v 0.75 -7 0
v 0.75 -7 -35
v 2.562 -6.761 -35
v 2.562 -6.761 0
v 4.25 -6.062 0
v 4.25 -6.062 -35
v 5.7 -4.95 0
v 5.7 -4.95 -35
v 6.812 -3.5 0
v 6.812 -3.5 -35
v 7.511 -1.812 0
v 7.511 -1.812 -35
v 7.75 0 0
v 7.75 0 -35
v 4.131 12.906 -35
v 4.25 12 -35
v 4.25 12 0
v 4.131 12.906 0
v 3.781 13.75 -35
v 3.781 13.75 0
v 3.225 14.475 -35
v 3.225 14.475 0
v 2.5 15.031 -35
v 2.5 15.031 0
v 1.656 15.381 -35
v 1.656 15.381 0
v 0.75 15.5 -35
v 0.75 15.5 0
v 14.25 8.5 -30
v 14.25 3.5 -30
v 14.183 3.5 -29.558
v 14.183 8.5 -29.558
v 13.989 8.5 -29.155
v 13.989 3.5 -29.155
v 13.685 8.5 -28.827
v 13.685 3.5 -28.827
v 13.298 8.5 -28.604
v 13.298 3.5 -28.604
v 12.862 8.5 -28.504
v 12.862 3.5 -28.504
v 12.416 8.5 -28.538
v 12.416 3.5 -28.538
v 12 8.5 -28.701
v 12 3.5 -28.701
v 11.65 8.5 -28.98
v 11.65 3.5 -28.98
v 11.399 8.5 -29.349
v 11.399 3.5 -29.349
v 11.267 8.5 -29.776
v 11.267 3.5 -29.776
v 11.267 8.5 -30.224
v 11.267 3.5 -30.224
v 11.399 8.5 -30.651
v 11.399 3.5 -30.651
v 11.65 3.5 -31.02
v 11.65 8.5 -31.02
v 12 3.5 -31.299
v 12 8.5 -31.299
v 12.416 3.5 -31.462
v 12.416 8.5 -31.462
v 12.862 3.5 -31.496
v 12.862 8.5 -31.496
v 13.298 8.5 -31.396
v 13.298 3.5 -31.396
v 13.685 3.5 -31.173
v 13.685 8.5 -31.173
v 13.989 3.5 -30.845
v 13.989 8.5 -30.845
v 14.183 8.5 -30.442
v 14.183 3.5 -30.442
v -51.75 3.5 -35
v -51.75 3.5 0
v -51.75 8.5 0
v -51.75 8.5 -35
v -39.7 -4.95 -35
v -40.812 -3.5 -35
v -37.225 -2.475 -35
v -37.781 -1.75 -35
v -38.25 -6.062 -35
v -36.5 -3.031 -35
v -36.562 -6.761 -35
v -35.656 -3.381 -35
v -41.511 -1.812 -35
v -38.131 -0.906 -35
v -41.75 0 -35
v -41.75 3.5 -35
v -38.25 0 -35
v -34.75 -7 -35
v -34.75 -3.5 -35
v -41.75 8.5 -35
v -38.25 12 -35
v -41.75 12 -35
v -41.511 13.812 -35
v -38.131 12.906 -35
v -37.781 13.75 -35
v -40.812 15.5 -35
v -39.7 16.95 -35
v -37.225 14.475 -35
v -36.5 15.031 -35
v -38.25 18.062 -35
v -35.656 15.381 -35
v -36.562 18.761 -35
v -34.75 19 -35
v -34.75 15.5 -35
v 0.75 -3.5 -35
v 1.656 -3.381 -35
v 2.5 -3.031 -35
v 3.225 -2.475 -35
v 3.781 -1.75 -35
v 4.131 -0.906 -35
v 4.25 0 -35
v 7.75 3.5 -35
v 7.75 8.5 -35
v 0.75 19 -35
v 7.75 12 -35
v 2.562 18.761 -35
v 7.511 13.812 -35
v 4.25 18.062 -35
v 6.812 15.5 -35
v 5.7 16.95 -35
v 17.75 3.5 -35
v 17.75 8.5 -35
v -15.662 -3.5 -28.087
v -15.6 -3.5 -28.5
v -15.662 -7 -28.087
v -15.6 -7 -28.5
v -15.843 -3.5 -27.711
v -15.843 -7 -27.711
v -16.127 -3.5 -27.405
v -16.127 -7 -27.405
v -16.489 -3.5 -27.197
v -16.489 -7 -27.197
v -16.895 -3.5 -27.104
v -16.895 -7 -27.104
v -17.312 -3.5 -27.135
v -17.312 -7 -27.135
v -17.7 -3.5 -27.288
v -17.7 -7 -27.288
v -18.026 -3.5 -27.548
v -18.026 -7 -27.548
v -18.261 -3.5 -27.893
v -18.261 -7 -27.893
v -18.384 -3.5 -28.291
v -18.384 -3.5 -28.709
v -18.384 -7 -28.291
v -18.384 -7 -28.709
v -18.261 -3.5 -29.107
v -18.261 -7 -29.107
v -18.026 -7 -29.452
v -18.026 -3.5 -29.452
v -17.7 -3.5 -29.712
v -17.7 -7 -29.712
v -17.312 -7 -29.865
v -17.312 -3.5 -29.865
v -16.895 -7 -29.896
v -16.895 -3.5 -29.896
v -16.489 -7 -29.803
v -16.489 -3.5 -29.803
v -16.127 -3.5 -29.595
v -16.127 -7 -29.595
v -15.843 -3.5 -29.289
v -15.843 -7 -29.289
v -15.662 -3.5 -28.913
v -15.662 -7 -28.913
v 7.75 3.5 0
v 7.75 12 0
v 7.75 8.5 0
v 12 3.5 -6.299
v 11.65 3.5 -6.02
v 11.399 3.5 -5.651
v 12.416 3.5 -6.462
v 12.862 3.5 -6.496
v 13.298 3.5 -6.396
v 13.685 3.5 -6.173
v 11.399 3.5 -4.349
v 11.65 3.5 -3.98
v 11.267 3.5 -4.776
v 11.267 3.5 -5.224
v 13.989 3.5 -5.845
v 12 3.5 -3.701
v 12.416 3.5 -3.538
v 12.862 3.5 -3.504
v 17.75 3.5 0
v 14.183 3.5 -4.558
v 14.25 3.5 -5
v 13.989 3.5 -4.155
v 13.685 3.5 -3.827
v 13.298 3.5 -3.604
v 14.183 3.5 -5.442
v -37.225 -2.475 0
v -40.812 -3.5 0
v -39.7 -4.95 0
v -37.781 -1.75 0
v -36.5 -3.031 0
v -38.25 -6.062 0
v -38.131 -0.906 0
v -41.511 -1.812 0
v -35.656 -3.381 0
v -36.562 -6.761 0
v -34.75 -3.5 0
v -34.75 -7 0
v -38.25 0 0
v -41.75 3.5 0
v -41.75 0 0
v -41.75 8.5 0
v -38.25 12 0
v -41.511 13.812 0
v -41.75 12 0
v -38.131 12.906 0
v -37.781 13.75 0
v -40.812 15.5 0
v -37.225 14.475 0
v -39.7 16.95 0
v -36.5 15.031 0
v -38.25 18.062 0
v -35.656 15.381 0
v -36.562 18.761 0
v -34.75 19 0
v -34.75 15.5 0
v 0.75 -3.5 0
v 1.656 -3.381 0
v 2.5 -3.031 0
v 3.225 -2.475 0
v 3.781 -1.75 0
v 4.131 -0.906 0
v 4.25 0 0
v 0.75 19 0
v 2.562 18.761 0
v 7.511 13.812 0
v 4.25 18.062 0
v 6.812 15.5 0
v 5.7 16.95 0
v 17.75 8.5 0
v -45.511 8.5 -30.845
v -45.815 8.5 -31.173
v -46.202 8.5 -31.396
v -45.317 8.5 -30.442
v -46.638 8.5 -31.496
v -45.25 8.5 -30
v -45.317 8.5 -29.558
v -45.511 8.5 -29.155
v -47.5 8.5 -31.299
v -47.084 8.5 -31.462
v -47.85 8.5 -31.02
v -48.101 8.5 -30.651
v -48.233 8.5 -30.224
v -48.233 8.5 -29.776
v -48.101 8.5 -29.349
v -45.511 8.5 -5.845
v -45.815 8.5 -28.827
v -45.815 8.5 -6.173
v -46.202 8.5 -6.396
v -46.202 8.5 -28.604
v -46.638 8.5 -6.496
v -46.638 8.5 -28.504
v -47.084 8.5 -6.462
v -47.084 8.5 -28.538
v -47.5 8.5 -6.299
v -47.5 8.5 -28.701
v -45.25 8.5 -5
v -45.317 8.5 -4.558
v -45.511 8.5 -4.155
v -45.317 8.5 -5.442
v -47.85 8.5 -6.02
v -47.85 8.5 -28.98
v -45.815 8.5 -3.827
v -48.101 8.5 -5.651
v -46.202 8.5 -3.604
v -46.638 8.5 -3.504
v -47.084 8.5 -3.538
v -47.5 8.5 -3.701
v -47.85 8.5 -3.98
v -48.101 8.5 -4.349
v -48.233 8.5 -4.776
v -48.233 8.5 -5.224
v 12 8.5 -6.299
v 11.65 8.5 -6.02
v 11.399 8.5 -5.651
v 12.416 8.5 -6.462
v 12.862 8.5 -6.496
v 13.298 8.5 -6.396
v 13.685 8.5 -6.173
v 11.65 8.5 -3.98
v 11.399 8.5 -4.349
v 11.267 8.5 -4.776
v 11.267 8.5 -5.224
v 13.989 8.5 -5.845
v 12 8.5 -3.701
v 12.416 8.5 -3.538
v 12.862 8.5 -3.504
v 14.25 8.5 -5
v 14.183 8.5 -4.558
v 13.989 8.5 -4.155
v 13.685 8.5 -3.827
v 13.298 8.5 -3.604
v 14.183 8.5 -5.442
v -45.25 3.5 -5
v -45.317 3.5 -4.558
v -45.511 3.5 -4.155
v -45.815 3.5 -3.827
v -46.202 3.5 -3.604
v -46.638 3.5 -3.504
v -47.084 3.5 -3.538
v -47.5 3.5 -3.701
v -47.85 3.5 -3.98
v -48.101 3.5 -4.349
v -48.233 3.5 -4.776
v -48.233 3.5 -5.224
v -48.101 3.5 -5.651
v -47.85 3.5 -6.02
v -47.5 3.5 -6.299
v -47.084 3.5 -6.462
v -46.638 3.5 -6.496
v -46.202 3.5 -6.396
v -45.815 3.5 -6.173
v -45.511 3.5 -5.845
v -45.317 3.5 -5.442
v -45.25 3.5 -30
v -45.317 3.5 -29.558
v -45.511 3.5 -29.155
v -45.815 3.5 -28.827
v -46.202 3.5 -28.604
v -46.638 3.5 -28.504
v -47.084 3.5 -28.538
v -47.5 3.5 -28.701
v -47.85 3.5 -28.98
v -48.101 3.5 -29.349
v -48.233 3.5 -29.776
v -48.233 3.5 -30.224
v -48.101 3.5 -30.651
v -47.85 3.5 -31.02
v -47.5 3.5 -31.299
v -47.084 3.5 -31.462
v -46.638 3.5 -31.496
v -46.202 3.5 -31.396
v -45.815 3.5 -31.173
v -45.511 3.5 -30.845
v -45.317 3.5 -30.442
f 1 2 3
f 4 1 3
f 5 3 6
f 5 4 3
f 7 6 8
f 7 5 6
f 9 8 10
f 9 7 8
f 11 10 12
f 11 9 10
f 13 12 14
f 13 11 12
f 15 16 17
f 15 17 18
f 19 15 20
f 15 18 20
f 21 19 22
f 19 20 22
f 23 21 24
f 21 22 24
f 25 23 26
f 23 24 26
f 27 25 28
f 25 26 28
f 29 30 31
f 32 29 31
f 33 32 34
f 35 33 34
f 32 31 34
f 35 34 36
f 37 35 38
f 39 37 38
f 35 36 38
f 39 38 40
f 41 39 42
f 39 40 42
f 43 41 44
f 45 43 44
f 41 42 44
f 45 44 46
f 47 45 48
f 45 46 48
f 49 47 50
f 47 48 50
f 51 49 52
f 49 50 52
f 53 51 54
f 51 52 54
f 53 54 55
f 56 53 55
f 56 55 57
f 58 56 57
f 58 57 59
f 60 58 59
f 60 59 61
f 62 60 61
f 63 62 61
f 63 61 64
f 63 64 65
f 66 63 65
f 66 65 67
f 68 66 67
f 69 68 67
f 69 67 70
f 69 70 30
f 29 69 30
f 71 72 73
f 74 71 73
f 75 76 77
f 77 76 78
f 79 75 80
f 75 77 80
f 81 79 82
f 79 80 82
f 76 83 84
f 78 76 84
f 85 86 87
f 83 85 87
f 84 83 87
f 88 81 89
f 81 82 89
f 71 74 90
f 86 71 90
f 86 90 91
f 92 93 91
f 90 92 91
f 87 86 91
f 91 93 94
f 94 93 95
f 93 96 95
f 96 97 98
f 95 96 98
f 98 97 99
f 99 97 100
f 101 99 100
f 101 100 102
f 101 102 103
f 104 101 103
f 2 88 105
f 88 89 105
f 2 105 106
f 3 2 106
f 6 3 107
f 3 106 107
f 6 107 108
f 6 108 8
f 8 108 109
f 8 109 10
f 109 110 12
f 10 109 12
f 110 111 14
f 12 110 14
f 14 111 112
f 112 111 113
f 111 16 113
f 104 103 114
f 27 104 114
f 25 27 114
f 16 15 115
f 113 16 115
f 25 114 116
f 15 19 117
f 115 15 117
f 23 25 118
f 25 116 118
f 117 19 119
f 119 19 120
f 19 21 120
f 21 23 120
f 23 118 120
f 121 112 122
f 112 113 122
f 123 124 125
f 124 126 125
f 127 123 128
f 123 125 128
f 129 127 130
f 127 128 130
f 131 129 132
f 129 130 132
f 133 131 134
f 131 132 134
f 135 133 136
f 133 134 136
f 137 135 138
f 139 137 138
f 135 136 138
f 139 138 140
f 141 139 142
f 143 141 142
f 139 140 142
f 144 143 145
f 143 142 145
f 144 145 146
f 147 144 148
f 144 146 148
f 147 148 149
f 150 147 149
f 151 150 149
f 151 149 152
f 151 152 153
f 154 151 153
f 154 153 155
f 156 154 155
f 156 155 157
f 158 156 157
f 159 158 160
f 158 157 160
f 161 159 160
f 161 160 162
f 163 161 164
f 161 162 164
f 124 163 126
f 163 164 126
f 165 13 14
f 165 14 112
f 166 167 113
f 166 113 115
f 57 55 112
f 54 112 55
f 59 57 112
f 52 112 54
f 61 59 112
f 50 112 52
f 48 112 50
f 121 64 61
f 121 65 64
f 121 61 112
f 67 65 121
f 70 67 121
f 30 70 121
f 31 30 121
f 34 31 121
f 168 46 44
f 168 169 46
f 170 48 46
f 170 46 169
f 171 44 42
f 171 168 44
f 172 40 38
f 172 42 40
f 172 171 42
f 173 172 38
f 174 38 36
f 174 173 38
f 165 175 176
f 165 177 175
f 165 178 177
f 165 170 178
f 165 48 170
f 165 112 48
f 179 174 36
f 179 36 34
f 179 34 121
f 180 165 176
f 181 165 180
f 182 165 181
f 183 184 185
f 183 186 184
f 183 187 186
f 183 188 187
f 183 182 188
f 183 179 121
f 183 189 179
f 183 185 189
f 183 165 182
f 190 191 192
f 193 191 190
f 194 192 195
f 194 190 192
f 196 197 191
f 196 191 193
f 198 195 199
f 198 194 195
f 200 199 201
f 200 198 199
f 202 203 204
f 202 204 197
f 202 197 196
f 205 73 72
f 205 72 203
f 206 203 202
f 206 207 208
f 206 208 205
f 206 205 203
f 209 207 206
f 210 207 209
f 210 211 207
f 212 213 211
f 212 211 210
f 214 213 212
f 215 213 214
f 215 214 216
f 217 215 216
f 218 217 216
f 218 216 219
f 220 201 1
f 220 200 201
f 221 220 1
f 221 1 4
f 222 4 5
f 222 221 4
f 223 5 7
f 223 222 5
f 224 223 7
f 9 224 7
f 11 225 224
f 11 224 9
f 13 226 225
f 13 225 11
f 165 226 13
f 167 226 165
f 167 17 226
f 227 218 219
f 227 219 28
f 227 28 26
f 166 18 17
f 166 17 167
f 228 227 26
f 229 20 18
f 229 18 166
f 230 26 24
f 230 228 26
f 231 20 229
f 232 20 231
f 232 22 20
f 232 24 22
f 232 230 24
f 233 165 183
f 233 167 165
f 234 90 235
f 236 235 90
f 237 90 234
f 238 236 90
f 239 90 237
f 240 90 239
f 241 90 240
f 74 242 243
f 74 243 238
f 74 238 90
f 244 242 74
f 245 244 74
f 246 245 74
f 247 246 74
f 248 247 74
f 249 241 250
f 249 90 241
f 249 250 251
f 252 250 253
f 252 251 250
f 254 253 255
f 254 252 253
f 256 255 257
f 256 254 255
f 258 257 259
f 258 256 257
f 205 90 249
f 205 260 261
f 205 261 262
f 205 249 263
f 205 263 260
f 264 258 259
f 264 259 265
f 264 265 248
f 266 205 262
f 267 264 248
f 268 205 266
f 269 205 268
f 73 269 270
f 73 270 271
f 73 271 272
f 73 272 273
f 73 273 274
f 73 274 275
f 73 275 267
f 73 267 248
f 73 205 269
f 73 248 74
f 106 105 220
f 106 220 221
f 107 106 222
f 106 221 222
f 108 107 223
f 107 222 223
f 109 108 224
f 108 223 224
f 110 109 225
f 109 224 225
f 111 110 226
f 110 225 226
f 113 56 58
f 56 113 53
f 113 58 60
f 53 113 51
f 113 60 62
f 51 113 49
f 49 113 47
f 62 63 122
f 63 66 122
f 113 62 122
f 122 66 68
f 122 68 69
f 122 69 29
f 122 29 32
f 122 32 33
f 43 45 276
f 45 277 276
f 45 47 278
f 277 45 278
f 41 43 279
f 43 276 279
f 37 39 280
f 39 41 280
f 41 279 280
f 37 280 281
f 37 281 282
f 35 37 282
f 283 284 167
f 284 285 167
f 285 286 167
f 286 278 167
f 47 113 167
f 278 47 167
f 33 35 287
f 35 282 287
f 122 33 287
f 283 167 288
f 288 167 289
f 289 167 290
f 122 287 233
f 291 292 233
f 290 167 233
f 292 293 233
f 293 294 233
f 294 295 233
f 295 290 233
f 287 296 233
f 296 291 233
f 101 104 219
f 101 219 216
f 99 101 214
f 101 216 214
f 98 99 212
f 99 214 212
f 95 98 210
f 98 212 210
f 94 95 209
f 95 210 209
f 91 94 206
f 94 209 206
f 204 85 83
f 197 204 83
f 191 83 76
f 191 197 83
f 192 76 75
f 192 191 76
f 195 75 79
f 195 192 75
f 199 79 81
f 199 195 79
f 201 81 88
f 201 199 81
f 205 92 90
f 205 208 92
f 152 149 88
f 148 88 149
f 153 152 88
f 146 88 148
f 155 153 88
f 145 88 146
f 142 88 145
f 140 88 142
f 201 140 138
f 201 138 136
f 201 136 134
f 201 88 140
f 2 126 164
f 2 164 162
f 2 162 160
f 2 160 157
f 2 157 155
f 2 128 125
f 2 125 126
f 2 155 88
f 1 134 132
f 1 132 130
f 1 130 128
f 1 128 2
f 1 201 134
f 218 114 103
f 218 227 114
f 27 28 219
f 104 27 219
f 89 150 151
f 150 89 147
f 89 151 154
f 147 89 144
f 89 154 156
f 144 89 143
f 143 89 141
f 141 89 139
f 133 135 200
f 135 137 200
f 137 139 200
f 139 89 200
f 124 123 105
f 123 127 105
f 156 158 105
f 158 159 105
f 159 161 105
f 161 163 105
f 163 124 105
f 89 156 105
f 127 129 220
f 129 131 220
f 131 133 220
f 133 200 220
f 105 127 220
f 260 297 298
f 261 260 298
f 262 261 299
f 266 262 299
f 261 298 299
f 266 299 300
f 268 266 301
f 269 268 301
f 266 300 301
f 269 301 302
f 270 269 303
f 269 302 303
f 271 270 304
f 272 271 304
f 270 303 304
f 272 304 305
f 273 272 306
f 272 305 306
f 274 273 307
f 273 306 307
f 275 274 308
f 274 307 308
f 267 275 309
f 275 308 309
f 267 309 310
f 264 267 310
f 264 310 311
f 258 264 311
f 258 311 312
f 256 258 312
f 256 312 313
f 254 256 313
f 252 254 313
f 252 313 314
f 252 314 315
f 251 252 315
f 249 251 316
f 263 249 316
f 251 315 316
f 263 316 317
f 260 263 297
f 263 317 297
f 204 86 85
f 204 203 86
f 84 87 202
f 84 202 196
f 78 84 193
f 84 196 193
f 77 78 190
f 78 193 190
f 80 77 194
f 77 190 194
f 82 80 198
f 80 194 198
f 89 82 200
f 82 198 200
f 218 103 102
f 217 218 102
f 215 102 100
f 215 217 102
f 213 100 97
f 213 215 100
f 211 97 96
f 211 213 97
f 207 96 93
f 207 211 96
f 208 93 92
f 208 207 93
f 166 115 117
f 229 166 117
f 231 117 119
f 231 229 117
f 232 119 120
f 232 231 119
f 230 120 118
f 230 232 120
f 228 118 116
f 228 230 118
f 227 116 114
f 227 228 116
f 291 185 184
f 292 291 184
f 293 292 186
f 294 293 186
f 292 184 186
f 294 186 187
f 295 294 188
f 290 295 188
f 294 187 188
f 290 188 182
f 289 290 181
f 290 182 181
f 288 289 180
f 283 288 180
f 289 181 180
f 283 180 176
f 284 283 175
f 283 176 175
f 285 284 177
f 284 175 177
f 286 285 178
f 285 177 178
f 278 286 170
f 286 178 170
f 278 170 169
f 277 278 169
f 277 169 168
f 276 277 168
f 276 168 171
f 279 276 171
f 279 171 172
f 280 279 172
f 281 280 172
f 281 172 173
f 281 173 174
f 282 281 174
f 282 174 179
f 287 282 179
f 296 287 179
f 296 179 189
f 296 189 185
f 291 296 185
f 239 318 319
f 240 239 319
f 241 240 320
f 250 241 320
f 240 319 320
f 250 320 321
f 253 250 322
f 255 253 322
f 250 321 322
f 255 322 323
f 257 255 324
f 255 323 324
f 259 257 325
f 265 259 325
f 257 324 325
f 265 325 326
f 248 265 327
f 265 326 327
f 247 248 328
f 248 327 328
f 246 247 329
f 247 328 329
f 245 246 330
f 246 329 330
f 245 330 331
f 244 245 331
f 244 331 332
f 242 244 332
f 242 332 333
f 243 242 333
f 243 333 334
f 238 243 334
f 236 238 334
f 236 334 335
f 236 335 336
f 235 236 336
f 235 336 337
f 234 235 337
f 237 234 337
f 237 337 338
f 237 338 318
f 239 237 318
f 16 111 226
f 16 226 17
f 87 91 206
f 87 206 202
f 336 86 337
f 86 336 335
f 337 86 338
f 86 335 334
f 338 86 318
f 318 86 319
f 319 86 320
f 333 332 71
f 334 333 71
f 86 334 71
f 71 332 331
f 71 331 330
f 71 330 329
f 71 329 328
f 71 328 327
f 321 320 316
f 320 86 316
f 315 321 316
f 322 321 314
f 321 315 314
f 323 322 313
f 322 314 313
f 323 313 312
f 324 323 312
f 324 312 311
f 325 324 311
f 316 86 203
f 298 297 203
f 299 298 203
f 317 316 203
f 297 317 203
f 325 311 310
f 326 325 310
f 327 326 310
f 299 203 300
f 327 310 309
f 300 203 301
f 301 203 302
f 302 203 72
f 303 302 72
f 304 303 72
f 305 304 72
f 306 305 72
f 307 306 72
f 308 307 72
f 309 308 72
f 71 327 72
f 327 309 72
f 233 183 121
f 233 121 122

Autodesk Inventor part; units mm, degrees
ref_plane "YZ Plane" through (0, 0, 0) normal (1, 0, 0) x (0, 1, 0)
ref_plane "XZ Plane" through (0, 0, 0) normal (0, 1, 0) x (-1, 0, 0)
ref_plane "XY Plane" through (0, 0, 0) normal (0, 0, 1) x (1, 0, 0)
sketch "Sketch1" plane through (0, 0, 0) normal (0, 0, 1) x (1, 0, 0)
  arc A0 (0, -3) -> (3, 0) centre (0, 0) ccw projected
  line L0 (3, 12) -> (3, 0) projected
  arc A1 (3, 12) -> (0, 15) centre (0, 12) ccw projected
  line L1 (-34, 15) -> (0, 15) projected
  arc A2 (-34, 15) -> (-37, 12) centre (-34, 12) ccw projected
  line L2 (-37, 0) -> (-37, 12) projected
  arc A3 (-37, 0) -> (-34, -3) centre (-34, 0) ccw projected
  line L3 (0, -3) -> (-34, -3) projected
  arc A4 (-32.9749, 5.5) -> (-28, 1) centre (-28, 6) ccw projected
  arc A5 (-28, 10) -> (-32.9749, 5.5) centre (-28, 5) ccw projected
  line L4 (-6, 10) -> (-28, 10) projected
  arc A6 (-1.0251, 5.5) -> (-6, 10) centre (-6, 5) ccw projected
  arc A7 (-6, 1) -> (-1.0251, 5.5) centre (-6, 6) ccw projected
  line L5 (-28, 1) -> (-6, 1) projected
  line L6 (-37.75, 0) -> (-37.75, 12)
  line L7 (3.75, 12) -> (3.75, 0)
  line L8 (0, 0) -> (0.75, 0)
  line L9 (0, 12) -> (0.75, 12)
  line L10 (-34, 12) -> (-34.75, 12)
  line L11 (-34, 0) -> (-34.75, 0)
  arc A8 (-37.75, 0) -> (-34.75, -3) centre (-34.75, 0) ccw
  line L12 (-34.75, 0) -> (-34.75, -3) construction
  line L13 (-34.75, 0) -> (-31.75, 0) construction
  arc A9 (0.75, -3) -> (3.75, 0) centre (0.75, 0) ccw
  arc A10 (3.75, 12) -> (0.75, 15) centre (0.75, 12) ccw
  arc A11 (-34.75, 15) -> (-37.75, 12) centre (-34.75, 12) ccw
  line L14 (-34.75, 12) -> (-34.75, 15) construction
  line L15 (-34.75, 12) -> (-37.75, 12) construction
  line L16 (-34, -3) -> (-34.75, -3)
  line L17 (-34, 15) -> (-34.75, 15)
  line L18 (0, 15) -> (0.75, 15)
  line L19 (0, -3) -> (0.75, -3)
  line L20 (-34, 15) -> (0, 15)
  line L21 (-34, -3) -> (0, -3)
  line L22 (-38.25, 12) -> (-38.25, 0)
  arc A12 (-38.25, 0) -> (-34.75, -3.5) centre (-34.75, 0) ccw
  line L23 (-34.75, -3.5) -> (-34, -3.5)
  line L24 (-34, -3.5) -> (0, -3.5)
  line L25 (0, -3.5) -> (0.75, -3.5)
  arc A13 (0.75, -3.5) -> (4.25, 0) centre (0.75, 0) ccw
  line L26 (4.25, 0) -> (4.25, 12)
  arc A14 (4.25, 12) -> (0.75, 15.5) centre (0.75, 12) ccw
  line L27 (0.75, 15.5) -> (0, 15.5)
  line L28 (0, 15.5) -> (-34, 15.5)
  line L29 (-34, 15.5) -> (-34.75, 15.5)
  arc A15 (-34.75, 15.5) -> (-38.25, 12) centre (-34.75, 12) ccw
  line L30 (-41.75, 12) -> (-41.75, 0)
  arc A16 (-41.75, 0) -> (-34.75, -7) centre (-34.75, 0) ccw
  line L31 (-34.75, -7) -> (-34, -7)
  line L32 (-34, -7) -> (0, -7)
  line L33 (0, -7) -> (0.75, -7)
  arc A17 (0.75, -7) -> (7.75, 0) centre (0.75, 0) ccw
  line L34 (7.75, 0) -> (7.75, 12)
  arc A18 (7.75, 12) -> (0.75, 19) centre (0.75, 12) ccw
  line L35 (0.75, 19) -> (0, 19)
  line L36 (0, 19) -> (-34, 19)
  line L37 (-34, 19) -> (-34.75, 19)
  arc A19 (-34.75, 19) -> (-41.75, 12) centre (-34.75, 12) ccw
  point P0 (0, 0)
  dimension "d1" = 40
  dimension "d4" = 0.75
  dimension "d5" = 0.75
  dimension "d6" = 0.75
  dimension "d7" = 0.75
  dimension "d8" = 0.75
  dimension "d9" = 90
  dimension "d10" = 90
  dimension "d11" = 0.5
  dimension "d12" = 3.5
extrude "Extrusion1" add sketch "Sketch1" against normal blind 35 contours A19 L37 L36 L35 A18 L34 A17 L33 L32 L31 A16 L30
sketch "Sketch2" plane through (0, 0, 0) normal (0, 0, 1) x (1, 0, 0)
  line L0 (-41.75, 12) -> (-41.75, 0) projected
  line L1 (7.75, 0) -> (7.75, 12) projected
  line L2 (7.75, 6) -> (17.75, 6)
  line L3 (-41.75, 6) -> (-51.75, 6)
  line L4 (-41.75, 8.5) -> (-51.75, 8.5)
  line L5 (-41.75, 3.5) -> (-51.75, 3.5)
  line L6 (7.75, 8.5) -> (17.75, 8.5)
  line L7 (7.75, 3.5) -> (17.75, 3.5)
  line L8 (17.75, 8.5) -> (7.75, 8.5)
  line L9 (7.75, 8.5) -> (7.75, 3.5)
  line L10 (7.75, 3.5) -> (17.75, 3.5)
  line L11 (17.75, 3.5) -> (17.75, 8.5)
  line L12 (-51.75, 8.5) -> (-41.75, 8.5)
  line L13 (-41.75, 8.5) -> (-41.75, 3.5)
  line L14 (-41.75, 3.5) -> (-51.75, 3.5)
  line L15 (-51.75, 3.5) -> (-51.75, 8.5)
  point P0 (0, 0)
  dimension "d15" = 10
  dimension "d16" = 10
  dimension "d17" = 2.5
  dimension "d18" = 2.5
  dimension "d19" = 2.5
  dimension "d20" = 2.5
extrude "Extrusion2" add sketch "Sketch2" against normal up to surface (35 mm away)
sketch "Sketch3" plane through (7.75, 3.5, 0) normal (0, -1, 0) x (1, 0, 0)
  line L0 (10, -35) -> (0, -35) projected
  line L1 (10, 0) -> (10, -35) projected
  line L2 (0, 0) -> (10, 0) projected
  line L3 (0, -35) -> (0, 0) projected
  line L4 (-49.5, -35) -> (-59.5, -35) projected
  line L5 (-49.5, 0) -> (-49.5, -35) projected
  line L6 (-59.5, 0) -> (-49.5, 0) projected
  line L7 (-59.5, 0) -> (-59.5, -35) projected
  circle A0 centre (5, -5) radius 5
  circle A1 centre (5, -30) radius 5
  circle A2 centre (-54.5, -5) radius 5
  circle A3 centre (-54.5, -30) radius 5
  circle A4 centre (-54.5, -5) radius 1.5
  circle A5 centre (-54.5, -30) radius 1.5
  circle A6 centre (5, -5) radius 1.5
  circle A7 centre (5, -30) radius 1.5
  point P0 (-7.75, 0)
  dimension "d23" = 3
  dimension "d24" = 3
  dimension "d25" = 3
  dimension "d26" = 3
extrude "Extrusion3" cut sketch "Sketch3" against normal blind 10 contours A4 | A5 | A6 | A7
sketch "Sketch4" plane through (-34.75, -7, 0) normal (0, -1, 0) x (1, 0, 0)
  line L0 (0, 0) -> (35.5, 0) projected
  line L1 (17.75, 0) -> (17.75, -26)
  line L2 (17.75, -26) -> (17.75, -31)
  circle A0 centre (17.75, -28.5) radius 2.5
  circle A1 centre (17.75, -28.5) radius 1.4
  point P0 (34.75, 0)
  dimension "d29" = 26
  dimension "d30" = 5
  dimension "d31" = 2.8
extrude "Extrusion4" cut sketch "Sketch4" against normal blind 10 contours A1 L2 | L2 A1
equation "\"d21\" = d18"
properties part number "camHolder_3DPrint"
